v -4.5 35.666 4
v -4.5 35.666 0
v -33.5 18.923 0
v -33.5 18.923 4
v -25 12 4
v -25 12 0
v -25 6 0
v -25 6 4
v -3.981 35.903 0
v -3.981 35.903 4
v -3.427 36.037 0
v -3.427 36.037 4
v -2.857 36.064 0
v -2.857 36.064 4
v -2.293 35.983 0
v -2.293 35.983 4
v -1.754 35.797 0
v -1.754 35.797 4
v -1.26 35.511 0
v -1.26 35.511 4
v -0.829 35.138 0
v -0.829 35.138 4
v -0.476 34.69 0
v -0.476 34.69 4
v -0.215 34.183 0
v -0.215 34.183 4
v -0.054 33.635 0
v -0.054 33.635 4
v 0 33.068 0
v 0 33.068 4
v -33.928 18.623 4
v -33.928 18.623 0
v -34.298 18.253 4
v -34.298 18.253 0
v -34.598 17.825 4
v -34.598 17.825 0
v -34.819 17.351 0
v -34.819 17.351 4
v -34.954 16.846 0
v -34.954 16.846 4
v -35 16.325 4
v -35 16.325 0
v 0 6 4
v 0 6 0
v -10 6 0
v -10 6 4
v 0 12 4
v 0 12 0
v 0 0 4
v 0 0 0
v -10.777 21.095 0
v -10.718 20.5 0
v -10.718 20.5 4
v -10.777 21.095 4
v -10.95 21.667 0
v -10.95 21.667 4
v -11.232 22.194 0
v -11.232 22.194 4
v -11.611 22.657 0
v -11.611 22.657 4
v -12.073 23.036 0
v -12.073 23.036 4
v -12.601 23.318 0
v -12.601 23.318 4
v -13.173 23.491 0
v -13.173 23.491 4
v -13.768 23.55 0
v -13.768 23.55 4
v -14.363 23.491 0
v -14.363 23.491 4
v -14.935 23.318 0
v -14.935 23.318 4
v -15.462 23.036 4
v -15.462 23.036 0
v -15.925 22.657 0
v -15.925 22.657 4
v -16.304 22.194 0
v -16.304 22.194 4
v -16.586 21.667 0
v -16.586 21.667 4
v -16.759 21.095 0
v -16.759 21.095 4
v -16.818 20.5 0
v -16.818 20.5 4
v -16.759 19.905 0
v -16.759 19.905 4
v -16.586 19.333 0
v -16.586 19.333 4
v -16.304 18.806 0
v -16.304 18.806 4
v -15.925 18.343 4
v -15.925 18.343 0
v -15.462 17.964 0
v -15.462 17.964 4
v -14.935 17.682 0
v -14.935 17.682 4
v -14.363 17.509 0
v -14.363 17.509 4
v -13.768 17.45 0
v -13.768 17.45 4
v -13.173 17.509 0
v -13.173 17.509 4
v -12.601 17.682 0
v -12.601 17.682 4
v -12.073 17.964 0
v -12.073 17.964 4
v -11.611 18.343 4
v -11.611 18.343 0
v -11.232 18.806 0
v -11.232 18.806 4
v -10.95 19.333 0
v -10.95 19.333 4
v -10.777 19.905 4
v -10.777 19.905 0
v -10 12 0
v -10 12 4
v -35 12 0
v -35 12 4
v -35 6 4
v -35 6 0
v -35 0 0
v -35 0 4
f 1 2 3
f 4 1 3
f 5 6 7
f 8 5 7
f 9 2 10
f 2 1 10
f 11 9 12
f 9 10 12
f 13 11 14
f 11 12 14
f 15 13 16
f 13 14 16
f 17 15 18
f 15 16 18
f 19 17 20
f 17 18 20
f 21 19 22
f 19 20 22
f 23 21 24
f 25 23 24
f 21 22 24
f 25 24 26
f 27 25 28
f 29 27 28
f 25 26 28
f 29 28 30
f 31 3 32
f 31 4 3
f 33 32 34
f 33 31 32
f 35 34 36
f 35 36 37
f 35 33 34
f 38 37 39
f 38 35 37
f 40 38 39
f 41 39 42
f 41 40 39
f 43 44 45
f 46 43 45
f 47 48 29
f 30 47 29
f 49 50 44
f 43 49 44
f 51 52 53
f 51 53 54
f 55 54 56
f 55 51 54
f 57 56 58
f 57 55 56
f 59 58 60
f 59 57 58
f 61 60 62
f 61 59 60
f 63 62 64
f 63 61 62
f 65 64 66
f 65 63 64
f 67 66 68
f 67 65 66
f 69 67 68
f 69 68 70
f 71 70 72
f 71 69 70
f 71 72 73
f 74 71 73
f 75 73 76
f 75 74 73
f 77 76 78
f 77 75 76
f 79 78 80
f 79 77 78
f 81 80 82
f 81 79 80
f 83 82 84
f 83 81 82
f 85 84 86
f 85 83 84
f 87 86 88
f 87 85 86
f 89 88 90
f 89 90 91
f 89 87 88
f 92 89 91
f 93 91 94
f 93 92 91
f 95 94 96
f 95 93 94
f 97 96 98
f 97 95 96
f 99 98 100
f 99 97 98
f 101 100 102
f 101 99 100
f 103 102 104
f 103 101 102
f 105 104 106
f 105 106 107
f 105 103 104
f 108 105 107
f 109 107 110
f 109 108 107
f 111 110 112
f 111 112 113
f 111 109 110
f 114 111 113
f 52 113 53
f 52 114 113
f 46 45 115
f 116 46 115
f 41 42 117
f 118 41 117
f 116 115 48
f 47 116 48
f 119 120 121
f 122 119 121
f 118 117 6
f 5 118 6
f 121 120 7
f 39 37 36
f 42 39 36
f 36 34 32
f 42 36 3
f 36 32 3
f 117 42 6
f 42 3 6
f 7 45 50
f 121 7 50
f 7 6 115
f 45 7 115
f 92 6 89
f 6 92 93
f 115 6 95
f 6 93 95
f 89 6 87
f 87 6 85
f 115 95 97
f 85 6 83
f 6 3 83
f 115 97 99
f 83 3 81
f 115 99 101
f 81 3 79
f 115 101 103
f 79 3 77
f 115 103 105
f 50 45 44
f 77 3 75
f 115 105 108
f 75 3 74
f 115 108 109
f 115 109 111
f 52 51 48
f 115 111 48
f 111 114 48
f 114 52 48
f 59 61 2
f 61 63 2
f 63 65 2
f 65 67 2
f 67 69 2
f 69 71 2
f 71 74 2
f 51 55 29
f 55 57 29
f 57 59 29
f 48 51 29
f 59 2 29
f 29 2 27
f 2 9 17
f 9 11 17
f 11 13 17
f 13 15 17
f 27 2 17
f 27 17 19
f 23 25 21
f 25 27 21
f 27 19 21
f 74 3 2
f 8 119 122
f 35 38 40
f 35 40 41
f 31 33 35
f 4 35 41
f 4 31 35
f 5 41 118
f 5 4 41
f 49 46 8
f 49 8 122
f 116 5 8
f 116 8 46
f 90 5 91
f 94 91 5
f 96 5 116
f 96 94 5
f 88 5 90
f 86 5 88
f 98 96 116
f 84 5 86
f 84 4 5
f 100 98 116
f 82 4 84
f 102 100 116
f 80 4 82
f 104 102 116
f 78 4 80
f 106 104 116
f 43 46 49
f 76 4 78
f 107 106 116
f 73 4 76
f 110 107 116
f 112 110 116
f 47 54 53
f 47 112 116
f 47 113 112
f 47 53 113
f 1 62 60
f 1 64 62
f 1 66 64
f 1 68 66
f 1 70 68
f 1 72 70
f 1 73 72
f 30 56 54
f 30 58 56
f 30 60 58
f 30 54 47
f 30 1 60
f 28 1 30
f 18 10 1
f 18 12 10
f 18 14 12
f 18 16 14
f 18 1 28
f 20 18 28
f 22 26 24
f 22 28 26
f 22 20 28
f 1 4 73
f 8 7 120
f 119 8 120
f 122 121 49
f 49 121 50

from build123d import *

# Parameters (mm, degrees)
ESBO_O1_R                = 3.05
RESSALTO_EXTRUS_O1_DEPTH = 4
FILETE1_R                = 3


with BuildPart() as part:
    # Esboço1 → Ressalto-extrusão1 (new body)
    with BuildSketch(Plane.XY):
        Polygon((0, 38.263883749), (-35, 18.056624327), (-35, 12), (-25, 12), (-25, 6), (-35, 6), (-35, 0), (0, 0), (0, 6), (-10, 6), (-10, 12), (0, 12), align=None)
        with Locations((-13.767949192, 20.5)):
            Circle(ESBO_O1_R, mode=Mode.SUBTRACT)
    extrude(amount=RESSALTO_EXTRUS_O1_DEPTH)

    # Filete1
    filete1_edges = [part.edges().sort_by_distance(p)[0] for p in [
        (-35, 18.056624327, 2),
        (0, 38.263883749, 2),
    ]]
    fillet(filete1_edges, radius=FILETE1_R)


solid = part.part
